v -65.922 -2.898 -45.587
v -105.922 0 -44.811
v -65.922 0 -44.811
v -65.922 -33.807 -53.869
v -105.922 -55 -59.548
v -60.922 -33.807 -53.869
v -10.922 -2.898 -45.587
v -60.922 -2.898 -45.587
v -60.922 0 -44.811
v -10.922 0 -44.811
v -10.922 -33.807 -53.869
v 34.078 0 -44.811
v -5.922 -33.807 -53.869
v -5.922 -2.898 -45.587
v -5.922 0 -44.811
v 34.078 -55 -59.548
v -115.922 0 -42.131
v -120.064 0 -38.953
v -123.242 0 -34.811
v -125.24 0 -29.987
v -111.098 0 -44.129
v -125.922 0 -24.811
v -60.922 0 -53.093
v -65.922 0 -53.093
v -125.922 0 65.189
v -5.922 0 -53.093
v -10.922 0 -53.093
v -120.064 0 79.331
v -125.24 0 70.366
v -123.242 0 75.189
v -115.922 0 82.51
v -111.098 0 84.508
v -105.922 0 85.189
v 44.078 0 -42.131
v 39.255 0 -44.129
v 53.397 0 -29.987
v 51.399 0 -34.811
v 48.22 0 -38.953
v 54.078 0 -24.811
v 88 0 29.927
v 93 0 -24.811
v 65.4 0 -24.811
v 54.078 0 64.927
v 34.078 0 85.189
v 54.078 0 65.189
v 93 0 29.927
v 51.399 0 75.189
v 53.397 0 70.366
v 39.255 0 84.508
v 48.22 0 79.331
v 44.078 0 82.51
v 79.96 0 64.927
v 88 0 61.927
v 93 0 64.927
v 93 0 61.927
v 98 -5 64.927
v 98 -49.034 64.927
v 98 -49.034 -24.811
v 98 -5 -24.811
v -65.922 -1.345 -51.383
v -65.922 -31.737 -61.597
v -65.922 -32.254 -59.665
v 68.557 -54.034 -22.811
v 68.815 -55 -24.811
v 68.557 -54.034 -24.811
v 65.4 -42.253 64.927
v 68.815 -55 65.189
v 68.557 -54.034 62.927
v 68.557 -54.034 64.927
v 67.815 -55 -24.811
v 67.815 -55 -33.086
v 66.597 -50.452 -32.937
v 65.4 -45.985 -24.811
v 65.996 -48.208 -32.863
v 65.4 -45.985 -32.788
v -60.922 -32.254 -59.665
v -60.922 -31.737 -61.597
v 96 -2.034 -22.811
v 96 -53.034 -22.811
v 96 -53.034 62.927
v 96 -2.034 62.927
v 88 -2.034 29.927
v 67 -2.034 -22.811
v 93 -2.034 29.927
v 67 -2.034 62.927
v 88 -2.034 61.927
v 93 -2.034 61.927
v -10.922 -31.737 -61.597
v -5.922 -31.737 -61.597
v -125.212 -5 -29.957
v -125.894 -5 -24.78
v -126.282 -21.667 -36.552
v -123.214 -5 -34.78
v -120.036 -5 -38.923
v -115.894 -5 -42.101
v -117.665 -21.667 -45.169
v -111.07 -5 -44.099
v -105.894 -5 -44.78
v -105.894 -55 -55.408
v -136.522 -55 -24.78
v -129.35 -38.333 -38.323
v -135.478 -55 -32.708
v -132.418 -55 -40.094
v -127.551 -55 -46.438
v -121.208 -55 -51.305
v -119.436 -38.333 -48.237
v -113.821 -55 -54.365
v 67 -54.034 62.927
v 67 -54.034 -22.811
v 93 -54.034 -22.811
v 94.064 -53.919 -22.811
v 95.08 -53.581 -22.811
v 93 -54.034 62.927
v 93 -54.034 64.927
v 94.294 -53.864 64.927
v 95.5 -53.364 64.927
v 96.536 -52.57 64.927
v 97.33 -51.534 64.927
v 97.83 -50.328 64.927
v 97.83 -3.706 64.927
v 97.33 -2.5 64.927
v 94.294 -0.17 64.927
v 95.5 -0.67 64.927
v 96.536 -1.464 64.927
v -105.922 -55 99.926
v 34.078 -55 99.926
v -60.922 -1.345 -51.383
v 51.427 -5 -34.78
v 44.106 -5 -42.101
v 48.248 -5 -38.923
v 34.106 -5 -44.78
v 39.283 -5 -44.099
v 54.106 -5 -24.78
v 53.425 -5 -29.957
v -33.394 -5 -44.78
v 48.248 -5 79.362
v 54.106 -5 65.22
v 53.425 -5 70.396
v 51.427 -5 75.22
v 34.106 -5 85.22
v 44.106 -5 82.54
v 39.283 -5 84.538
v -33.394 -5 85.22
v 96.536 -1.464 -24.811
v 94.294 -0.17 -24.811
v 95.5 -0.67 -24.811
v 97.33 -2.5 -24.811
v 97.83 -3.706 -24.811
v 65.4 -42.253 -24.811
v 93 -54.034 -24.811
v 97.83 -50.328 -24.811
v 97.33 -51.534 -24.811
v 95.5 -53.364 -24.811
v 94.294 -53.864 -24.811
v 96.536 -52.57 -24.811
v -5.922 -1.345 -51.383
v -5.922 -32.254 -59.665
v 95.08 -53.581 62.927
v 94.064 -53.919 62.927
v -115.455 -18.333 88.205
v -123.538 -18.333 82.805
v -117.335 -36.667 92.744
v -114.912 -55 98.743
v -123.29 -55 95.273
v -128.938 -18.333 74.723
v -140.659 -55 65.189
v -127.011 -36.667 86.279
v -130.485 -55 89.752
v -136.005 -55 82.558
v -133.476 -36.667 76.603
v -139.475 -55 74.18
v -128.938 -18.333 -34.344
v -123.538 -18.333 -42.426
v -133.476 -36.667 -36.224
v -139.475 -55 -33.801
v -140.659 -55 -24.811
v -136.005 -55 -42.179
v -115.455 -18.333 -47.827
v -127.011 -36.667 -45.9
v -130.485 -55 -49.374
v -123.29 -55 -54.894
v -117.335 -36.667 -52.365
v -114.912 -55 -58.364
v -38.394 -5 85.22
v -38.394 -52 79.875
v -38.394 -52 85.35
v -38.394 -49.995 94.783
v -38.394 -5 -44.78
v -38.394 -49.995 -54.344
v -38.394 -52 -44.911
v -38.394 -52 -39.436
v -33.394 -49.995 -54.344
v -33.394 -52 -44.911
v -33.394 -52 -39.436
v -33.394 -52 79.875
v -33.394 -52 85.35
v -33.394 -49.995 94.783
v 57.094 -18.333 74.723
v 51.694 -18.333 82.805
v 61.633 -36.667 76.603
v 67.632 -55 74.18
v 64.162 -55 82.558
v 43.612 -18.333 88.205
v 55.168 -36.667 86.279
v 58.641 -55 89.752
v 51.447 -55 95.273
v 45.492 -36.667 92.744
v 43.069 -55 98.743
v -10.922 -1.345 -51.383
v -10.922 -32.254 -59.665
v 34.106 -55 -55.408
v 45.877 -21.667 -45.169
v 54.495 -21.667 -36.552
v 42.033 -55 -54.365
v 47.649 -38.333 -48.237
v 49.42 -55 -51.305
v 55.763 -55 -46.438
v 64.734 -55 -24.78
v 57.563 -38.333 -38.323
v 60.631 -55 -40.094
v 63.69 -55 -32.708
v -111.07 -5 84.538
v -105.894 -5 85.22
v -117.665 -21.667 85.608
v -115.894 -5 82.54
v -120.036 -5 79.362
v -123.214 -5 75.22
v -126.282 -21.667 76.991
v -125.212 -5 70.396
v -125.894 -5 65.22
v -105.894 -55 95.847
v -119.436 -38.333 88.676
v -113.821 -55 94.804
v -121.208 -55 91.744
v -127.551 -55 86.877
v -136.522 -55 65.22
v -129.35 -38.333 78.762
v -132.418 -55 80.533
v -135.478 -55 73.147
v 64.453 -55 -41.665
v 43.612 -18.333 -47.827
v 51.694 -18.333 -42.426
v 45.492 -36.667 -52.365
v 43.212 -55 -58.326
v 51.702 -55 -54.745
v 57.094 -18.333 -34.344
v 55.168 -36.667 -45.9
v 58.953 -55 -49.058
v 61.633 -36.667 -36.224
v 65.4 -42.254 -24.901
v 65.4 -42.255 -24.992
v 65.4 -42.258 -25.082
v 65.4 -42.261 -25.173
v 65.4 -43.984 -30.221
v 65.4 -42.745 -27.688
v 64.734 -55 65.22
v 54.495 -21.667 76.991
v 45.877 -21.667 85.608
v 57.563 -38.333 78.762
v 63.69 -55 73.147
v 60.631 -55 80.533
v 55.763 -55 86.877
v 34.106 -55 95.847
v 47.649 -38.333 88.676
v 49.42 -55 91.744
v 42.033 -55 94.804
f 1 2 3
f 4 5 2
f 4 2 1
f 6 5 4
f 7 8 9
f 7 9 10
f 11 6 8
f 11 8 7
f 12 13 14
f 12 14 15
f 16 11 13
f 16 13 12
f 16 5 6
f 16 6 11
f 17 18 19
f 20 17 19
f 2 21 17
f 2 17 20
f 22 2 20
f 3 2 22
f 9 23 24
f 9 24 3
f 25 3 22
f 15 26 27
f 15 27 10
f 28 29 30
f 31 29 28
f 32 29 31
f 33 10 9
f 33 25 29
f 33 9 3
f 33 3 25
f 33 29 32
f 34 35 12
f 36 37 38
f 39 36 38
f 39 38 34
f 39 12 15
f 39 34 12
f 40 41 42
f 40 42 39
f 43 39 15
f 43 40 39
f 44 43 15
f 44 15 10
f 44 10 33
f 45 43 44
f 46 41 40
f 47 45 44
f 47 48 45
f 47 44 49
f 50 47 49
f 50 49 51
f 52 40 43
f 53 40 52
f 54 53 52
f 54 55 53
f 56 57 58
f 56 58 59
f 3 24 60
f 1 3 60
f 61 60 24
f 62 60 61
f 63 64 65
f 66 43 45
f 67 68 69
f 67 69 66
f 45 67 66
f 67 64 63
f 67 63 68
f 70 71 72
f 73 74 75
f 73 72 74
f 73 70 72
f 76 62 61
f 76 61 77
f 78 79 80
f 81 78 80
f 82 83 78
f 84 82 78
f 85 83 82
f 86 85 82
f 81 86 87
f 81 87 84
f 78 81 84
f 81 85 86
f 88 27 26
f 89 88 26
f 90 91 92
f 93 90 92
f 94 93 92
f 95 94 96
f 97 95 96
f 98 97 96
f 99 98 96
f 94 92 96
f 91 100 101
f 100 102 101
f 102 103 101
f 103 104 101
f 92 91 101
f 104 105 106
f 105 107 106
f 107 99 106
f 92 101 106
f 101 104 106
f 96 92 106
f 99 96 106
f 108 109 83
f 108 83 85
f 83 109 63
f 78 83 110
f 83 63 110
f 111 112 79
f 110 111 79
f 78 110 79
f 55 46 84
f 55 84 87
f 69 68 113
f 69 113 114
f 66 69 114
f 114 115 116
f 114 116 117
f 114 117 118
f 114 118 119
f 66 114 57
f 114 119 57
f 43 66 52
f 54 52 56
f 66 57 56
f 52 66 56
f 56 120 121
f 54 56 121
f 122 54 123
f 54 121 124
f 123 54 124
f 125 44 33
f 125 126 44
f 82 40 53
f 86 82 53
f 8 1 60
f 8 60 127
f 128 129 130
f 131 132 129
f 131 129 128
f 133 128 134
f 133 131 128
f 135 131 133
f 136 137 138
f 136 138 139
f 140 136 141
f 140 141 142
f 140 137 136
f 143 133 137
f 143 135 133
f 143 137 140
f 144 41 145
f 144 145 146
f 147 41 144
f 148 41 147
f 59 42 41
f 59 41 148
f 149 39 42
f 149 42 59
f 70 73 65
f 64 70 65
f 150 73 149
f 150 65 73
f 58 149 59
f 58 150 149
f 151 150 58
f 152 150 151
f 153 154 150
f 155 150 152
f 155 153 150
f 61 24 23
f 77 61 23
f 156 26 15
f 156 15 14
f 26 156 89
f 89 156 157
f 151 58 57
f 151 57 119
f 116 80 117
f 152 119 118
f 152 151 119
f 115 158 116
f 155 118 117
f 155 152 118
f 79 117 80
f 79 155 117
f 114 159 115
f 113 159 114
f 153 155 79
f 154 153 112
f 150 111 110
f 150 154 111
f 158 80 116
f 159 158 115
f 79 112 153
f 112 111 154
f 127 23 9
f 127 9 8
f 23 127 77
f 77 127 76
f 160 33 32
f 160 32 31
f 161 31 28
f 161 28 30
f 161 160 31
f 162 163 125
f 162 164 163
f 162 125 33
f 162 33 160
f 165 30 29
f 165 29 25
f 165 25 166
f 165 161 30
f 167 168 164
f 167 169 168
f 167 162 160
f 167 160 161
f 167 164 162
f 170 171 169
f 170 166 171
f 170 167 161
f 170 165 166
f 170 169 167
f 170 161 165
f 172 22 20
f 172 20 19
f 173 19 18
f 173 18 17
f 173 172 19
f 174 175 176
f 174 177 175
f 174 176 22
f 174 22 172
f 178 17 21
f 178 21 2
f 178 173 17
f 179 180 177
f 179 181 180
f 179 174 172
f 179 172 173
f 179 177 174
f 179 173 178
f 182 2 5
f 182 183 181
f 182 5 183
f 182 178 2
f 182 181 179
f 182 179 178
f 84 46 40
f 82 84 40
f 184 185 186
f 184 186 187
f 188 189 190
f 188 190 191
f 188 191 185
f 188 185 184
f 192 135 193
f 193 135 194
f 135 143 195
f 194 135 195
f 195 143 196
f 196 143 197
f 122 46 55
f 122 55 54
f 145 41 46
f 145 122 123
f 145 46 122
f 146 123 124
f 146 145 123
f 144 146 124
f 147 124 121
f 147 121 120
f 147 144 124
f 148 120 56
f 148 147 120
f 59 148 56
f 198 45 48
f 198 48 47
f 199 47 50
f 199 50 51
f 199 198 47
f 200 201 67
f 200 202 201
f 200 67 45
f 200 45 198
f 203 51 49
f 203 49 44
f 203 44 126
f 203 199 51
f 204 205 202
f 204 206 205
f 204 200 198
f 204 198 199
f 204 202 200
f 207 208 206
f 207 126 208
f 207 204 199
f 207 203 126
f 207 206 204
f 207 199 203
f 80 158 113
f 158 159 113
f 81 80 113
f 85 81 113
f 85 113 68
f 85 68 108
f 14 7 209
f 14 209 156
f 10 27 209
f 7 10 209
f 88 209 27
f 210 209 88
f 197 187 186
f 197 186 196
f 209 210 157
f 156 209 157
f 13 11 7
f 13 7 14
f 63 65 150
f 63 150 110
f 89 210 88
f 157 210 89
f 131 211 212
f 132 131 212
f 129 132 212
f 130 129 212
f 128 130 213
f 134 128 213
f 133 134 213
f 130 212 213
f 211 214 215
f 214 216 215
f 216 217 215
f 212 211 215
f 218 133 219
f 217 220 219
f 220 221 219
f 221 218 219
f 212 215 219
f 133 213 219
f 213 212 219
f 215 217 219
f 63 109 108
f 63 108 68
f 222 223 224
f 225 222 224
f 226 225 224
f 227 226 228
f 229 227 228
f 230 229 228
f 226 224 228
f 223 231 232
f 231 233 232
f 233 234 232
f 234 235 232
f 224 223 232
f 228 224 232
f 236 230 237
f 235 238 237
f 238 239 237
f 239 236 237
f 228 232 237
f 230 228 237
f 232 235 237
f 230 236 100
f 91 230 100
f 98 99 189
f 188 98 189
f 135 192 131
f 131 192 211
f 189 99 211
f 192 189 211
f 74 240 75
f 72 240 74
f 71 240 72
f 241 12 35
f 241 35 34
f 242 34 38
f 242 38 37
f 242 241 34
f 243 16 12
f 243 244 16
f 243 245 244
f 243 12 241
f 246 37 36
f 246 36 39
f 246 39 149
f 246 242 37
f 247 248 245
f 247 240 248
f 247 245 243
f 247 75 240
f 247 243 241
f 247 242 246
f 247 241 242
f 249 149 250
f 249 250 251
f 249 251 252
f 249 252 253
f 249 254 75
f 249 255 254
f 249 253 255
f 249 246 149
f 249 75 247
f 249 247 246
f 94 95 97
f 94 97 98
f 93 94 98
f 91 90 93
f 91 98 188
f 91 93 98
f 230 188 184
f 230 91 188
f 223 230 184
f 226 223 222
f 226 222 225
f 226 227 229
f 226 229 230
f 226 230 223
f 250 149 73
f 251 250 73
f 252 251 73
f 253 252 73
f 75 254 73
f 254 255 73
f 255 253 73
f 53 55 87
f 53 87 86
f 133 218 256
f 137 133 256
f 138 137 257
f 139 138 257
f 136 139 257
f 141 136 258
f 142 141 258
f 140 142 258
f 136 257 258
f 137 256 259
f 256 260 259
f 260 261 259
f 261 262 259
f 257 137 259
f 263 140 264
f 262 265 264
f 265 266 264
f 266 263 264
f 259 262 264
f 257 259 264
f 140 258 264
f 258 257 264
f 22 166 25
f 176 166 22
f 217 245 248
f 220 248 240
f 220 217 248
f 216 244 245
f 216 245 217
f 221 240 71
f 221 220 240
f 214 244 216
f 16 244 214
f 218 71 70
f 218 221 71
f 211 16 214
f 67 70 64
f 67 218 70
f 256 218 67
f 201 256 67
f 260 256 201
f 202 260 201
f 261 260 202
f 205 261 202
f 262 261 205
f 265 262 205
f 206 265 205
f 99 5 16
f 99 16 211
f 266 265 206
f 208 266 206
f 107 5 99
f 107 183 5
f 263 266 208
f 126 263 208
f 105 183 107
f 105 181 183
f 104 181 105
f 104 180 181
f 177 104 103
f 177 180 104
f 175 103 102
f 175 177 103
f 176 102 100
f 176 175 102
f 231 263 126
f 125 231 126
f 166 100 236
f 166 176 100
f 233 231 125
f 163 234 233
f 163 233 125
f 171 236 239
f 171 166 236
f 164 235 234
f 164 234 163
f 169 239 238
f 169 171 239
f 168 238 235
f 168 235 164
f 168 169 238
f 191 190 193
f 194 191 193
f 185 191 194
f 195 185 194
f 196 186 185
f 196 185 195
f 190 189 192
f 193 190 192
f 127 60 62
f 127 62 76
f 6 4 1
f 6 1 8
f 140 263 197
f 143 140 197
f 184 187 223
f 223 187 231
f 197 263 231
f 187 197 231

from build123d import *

# Parameters (mm, degrees)
F1_DEPTH     = 55
F1_TAPER     = -15
F4_DEPTH     = 55
F4_TAPER     = -12
F5_W         = 5
F5_H         = 130
F6_DEPTH     = 47
F10_W        = 360.01701653
F10_H        = 225.87454319
F11_DEPTH    = 25
F12_W        = 5
F12_H        = 46
F13_DEPTH    = 15
F14_W        = 5
F14_H        = 46
F15_DEPTH    = 15
F8_W         = 54.0339685977
F8_H         = 90.1
F16_DEPTH    = 32.6
F9_W         = 55.9400806222
F9_H         = 89.7377200425
F17_DEPTH    = 25
F18_W        = 347.7291613817
F18_H        = 217.2330617905
F19_DEPTH    = 25
F20_W        = 34.4053636551
F20_H        = 45.9854951713
F21_DEPTH    = 25
F22_W        = 1.5565819549
F22_H        = 85.7377200425
F22_W_2      = 27.4434180451
F23_DEPTH    = 52
F24_T1_DEPTH = 114.7377200425
F26_DEPTH    = 25
F27_W        = 5
F27_H        = 32
F28_DEPTH    = 10
F29_W        = 5
F29_H        = 35
F30_DEPTH    = 8
F31_W        = 122.5292943418
F31_H        = 48.8124843687
F32_DEPTH    = 25
F33_W        = 5
F33_H        = 6
F33_W_2      = 6
F34_DEPTH    = 32


# Not quite as in the source:
# - a fillet or chamfer that OpenCascade refuses, or shapes differently, is made with other operations: its cross-section is extruded or revolved along the edge and cut away or added
# - ends of sketch curves that miss each other by under 0.0002 mm in the source are joined


with BuildPart() as f1:
    # F0 (on Front) → F1 (new body)
    with BuildSketch(Plane.XZ):
        with BuildLine():
            Line((34.0782237053, 85.1892769337), (-105.9217762947, 85.1892769337))
            ThreePointArc((-105.9217762947, 85.1892769337), (-120.0639119184, 79.3314125574), (-125.9217762947, 65.1892769337))
            Line((-125.9217762947, 65.1892769337), (-125.9217762947, -24.8107230663))
            ThreePointArc((-125.9217762947, -24.8107230663), (-120.0639119184, -38.9528586901), (-105.9217762947, -44.8107230663))
            Line((-105.9217762947, -44.8107230663), (34.0782237053, -44.8107230663))
            ThreePointArc((34.0782237053, -44.8107230663), (48.220359329, -38.9528586901), (54.0782237053, -24.8107230663))
            Line((54.0782237053, -24.8107230663), (54.0782237053, 65.1892769337))
            ThreePointArc((54.0782237053, 65.1892769337), (48.220359329, 79.3314125574), (34.0782237053, 85.1892769337))
        make_face()
    extrude(amount=F1_DEPTH, taper=F1_TAPER)

    # F3 (on offset) → F4 (cut)
    with BuildSketch(Plane.XZ.offset(5)):
        with BuildLine():
            Line((34.106137666, 85.2195297501), (-105.893862334, 85.2195297501))
            ThreePointArc((-105.893862334, 85.2195297501), (-120.0359979577, 79.3616653739), (-125.893862334, 65.2195297501))
            Line((-125.893862334, 65.2195297501), (-125.893862334, -24.7804702499))
            ThreePointArc((-125.893862334, -24.7804702499), (-120.0359979577, -38.9226058736), (-105.893862334, -44.7804702499))
            Line((-105.893862334, -44.7804702499), (34.106137666, -44.7804702499))
            ThreePointArc((34.106137666, -44.7804702499), (48.2482732898, -38.9226058736), (54.106137666, -24.7804702499))
            Line((54.106137666, -24.7804702499), (54.106137666, 65.2195297501))
            ThreePointArc((54.106137666, 65.2195297501), (48.2482732898, 79.3616653739), (34.106137666, 85.2195297501))
        make_face()
    extrude(amount=F4_DEPTH, taper=F4_TAPER, mode=Mode.SUBTRACT)

    # F5 (on face) → F6 (join)
    with BuildSketch(Plane.XZ.offset(5)):
        with Locations((-35.893862334, 20.2195297501)):
            Rectangle(F5_W, F5_H)
    extrude(amount=F6_DEPTH)

    # F10 (on Front) → F11 (cut)
    with BuildSketch(Plane.XZ):
        with Locations((5.3876563907, 10.9746605158)):
            Rectangle(F10_W, F10_H)
    extrude(amount=-F11_DEPTH, mode=Mode.SUBTRACT)

    # F12 (on face) → F13 (join)
    with BuildSketch(Plane(origin=(0, 8.8907927165, -41.8278911112), x_dir=(1, 0, 0), z_dir=(0, -0.2079116908, 0.9781476007))):
        with Locations((-35.893862334, -37.2011212889)):
            Rectangle(F12_W, F12_H)
    extrude(amount=F13_DEPTH)

    # F14 (on face) → F15 (join)
    with BuildSketch(Plane(origin=(0, 17.1148163716, 80.5188804202), x_dir=(1, 0, 0), z_dir=(0, -0.2079116908, -0.9781476007))):
        with Locations((-35.893862334, 45.6088745247)):
            Rectangle(F14_W, F14_H)
    extrude(amount=F15_DEPTH)

    # F8 (on offset) → F16 (join)
    with BuildSketch(Plane.YZ.offset(98)):
        with Locations((-27.0169842988, 19.8769969761)):
            Rectangle(F8_W, F8_H)
    extrude(amount=-F16_DEPTH)

    # F9 (on face) → F17 (join)
    with BuildSketch(Plane(origin=(50.4556696128, 13.5195559263, 0), x_dir=(-0.2588190451, 0.9659258263, 0), z_dir=(0.9659258263, 0.2588190451, 0))):
        with Locations((-41.9665145313, 20.0581369549)):
            Rectangle(F9_W, F9_H)
    extrude(amount=F17_DEPTH)

    # F18 (on Front) → F19 (cut)
    with BuildSketch(Plane.XZ):
        with Locations((0.111065805, 20.1892703772)):
            Rectangle(F18_W, F18_H)
    extrude(amount=-F19_DEPTH, mode=Mode.SUBTRACT)

    # F20 (on face) → F21 (cut)
    with BuildSketch(Plane(origin=(0, 0, -24.8107230663), x_dir=(1, 0, 0), z_dir=(0, 0, -1))):
        Polygon((68.0166854944, 55.7510983837), (65.4, 45.9854951713), (99.8053636551, 45.9854951713), (100.283839941, 55.7510983837), align=None)
        with Locations((82.6026818275, 22.9927475857)):
            Rectangle(F20_W, F20_H)
    extrude(amount=F21_DEPTH, mode=Mode.SUBTRACT)

    # F22 (on face) → F23 (cut)
    with BuildSketch(Plane.XZ.offset(54.0339685977)):
        with Locations((67.7782909774, 20.0581369549)):
            Rectangle(F22_W, F22_H)
        with Locations((82.2782909774, 20.0581369549)):
            Rectangle(F22_W_2, F22_H)
    extrude(amount=-F23_DEPTH, mode=Mode.SUBTRACT)

    # F24: fillet of radius 5 on 2 edges, made by hand

    # F24_s2 → F24_t1 (cut)
    with BuildSketch(Plane.XY.offset(-37.3107230663)):
        with BuildLine():
            ThreePointArc((98, -49.0339685977), (96.5355339059, -52.5695025036), (93, -54.0339685977))
            Line((93, -54.0339685977), (98, -54.0339685977))
            Line((98, -54.0339685977), (98, -49.0339685977))
        make_face()
        with BuildLine():
            ThreePointArc((93, 0), (96.5355339059, -1.4644660941), (98, -5))
            Line((98, -5), (98, 0))
            Line((98, 0), (93, 0))
        make_face()
    extrude(amount=F24_T1_DEPTH, mode=Mode.SUBTRACT)

    # F25 (on face) → F26 (cut)
    with BuildSketch(Plane.XZ.offset(52)):
        Polygon((-33.3938625455, 92.2565162182), (-38.3938625455, 92.2565162182), (-38.3938625455, -53.0670173466), (-33.393862334, -53.0670173466), align=None)
    extrude(amount=F26_DEPTH, mode=Mode.SUBTRACT)

    # F27 (on face) → F28 (cut)
    with BuildSketch(Plane(origin=(0, 0, 0), x_dir=(-1, 0, 0), z_dir=(0, 1, 0))):
        with Locations((-90.5, 45.9269969761)):
            Rectangle(F27_W, F27_H)
    extrude(amount=-F28_DEPTH, mode=Mode.SUBTRACT)

    # F29 (on face) → F30 (join)
    with BuildSketch(Plane(origin=(0, 11.2026807666, -41.8089738019), x_dir=(1, 0, 0), z_dir=(0, 0.2588190451, -0.9659258263))):
        with Locations((-63.4217762947, 29.0978685544)):
            Rectangle(F29_W, F29_H)
        with Locations((-8.4217762947, 29.0978685544)):
            Rectangle(F29_W, F29_H)
    extrude(amount=F30_DEPTH)

    # F31 (on face) → F32 (cut)
    with BuildSketch(Plane(origin=(0, 0, 0), x_dir=(-1, 0, 0), z_dir=(0, 1, 0))):
        with Locations((32.052250579, -48.6711980775)):
            Rectangle(F31_W, F31_H)
    extrude(amount=F32_DEPTH, mode=Mode.SUBTRACT)

    # F33 (on face) → F34 (cut)
    with BuildSketch(Plane(origin=(0, -45.0100846867, -12.0604158431), x_dir=(1, 0, 0), z_dir=(0, -0.9659258263, -0.2588190451))):
        with Locations((-63.4217762947, -46.2838347045)):
            Rectangle(F33_W, F33_H)
        with Locations((-8.7768949285, -46.2838347045)):
            Rectangle(F33_W_2, F33_H)
    extrude(amount=-F34_DEPTH, mode=Mode.SUBTRACT)


solid = f1.part
